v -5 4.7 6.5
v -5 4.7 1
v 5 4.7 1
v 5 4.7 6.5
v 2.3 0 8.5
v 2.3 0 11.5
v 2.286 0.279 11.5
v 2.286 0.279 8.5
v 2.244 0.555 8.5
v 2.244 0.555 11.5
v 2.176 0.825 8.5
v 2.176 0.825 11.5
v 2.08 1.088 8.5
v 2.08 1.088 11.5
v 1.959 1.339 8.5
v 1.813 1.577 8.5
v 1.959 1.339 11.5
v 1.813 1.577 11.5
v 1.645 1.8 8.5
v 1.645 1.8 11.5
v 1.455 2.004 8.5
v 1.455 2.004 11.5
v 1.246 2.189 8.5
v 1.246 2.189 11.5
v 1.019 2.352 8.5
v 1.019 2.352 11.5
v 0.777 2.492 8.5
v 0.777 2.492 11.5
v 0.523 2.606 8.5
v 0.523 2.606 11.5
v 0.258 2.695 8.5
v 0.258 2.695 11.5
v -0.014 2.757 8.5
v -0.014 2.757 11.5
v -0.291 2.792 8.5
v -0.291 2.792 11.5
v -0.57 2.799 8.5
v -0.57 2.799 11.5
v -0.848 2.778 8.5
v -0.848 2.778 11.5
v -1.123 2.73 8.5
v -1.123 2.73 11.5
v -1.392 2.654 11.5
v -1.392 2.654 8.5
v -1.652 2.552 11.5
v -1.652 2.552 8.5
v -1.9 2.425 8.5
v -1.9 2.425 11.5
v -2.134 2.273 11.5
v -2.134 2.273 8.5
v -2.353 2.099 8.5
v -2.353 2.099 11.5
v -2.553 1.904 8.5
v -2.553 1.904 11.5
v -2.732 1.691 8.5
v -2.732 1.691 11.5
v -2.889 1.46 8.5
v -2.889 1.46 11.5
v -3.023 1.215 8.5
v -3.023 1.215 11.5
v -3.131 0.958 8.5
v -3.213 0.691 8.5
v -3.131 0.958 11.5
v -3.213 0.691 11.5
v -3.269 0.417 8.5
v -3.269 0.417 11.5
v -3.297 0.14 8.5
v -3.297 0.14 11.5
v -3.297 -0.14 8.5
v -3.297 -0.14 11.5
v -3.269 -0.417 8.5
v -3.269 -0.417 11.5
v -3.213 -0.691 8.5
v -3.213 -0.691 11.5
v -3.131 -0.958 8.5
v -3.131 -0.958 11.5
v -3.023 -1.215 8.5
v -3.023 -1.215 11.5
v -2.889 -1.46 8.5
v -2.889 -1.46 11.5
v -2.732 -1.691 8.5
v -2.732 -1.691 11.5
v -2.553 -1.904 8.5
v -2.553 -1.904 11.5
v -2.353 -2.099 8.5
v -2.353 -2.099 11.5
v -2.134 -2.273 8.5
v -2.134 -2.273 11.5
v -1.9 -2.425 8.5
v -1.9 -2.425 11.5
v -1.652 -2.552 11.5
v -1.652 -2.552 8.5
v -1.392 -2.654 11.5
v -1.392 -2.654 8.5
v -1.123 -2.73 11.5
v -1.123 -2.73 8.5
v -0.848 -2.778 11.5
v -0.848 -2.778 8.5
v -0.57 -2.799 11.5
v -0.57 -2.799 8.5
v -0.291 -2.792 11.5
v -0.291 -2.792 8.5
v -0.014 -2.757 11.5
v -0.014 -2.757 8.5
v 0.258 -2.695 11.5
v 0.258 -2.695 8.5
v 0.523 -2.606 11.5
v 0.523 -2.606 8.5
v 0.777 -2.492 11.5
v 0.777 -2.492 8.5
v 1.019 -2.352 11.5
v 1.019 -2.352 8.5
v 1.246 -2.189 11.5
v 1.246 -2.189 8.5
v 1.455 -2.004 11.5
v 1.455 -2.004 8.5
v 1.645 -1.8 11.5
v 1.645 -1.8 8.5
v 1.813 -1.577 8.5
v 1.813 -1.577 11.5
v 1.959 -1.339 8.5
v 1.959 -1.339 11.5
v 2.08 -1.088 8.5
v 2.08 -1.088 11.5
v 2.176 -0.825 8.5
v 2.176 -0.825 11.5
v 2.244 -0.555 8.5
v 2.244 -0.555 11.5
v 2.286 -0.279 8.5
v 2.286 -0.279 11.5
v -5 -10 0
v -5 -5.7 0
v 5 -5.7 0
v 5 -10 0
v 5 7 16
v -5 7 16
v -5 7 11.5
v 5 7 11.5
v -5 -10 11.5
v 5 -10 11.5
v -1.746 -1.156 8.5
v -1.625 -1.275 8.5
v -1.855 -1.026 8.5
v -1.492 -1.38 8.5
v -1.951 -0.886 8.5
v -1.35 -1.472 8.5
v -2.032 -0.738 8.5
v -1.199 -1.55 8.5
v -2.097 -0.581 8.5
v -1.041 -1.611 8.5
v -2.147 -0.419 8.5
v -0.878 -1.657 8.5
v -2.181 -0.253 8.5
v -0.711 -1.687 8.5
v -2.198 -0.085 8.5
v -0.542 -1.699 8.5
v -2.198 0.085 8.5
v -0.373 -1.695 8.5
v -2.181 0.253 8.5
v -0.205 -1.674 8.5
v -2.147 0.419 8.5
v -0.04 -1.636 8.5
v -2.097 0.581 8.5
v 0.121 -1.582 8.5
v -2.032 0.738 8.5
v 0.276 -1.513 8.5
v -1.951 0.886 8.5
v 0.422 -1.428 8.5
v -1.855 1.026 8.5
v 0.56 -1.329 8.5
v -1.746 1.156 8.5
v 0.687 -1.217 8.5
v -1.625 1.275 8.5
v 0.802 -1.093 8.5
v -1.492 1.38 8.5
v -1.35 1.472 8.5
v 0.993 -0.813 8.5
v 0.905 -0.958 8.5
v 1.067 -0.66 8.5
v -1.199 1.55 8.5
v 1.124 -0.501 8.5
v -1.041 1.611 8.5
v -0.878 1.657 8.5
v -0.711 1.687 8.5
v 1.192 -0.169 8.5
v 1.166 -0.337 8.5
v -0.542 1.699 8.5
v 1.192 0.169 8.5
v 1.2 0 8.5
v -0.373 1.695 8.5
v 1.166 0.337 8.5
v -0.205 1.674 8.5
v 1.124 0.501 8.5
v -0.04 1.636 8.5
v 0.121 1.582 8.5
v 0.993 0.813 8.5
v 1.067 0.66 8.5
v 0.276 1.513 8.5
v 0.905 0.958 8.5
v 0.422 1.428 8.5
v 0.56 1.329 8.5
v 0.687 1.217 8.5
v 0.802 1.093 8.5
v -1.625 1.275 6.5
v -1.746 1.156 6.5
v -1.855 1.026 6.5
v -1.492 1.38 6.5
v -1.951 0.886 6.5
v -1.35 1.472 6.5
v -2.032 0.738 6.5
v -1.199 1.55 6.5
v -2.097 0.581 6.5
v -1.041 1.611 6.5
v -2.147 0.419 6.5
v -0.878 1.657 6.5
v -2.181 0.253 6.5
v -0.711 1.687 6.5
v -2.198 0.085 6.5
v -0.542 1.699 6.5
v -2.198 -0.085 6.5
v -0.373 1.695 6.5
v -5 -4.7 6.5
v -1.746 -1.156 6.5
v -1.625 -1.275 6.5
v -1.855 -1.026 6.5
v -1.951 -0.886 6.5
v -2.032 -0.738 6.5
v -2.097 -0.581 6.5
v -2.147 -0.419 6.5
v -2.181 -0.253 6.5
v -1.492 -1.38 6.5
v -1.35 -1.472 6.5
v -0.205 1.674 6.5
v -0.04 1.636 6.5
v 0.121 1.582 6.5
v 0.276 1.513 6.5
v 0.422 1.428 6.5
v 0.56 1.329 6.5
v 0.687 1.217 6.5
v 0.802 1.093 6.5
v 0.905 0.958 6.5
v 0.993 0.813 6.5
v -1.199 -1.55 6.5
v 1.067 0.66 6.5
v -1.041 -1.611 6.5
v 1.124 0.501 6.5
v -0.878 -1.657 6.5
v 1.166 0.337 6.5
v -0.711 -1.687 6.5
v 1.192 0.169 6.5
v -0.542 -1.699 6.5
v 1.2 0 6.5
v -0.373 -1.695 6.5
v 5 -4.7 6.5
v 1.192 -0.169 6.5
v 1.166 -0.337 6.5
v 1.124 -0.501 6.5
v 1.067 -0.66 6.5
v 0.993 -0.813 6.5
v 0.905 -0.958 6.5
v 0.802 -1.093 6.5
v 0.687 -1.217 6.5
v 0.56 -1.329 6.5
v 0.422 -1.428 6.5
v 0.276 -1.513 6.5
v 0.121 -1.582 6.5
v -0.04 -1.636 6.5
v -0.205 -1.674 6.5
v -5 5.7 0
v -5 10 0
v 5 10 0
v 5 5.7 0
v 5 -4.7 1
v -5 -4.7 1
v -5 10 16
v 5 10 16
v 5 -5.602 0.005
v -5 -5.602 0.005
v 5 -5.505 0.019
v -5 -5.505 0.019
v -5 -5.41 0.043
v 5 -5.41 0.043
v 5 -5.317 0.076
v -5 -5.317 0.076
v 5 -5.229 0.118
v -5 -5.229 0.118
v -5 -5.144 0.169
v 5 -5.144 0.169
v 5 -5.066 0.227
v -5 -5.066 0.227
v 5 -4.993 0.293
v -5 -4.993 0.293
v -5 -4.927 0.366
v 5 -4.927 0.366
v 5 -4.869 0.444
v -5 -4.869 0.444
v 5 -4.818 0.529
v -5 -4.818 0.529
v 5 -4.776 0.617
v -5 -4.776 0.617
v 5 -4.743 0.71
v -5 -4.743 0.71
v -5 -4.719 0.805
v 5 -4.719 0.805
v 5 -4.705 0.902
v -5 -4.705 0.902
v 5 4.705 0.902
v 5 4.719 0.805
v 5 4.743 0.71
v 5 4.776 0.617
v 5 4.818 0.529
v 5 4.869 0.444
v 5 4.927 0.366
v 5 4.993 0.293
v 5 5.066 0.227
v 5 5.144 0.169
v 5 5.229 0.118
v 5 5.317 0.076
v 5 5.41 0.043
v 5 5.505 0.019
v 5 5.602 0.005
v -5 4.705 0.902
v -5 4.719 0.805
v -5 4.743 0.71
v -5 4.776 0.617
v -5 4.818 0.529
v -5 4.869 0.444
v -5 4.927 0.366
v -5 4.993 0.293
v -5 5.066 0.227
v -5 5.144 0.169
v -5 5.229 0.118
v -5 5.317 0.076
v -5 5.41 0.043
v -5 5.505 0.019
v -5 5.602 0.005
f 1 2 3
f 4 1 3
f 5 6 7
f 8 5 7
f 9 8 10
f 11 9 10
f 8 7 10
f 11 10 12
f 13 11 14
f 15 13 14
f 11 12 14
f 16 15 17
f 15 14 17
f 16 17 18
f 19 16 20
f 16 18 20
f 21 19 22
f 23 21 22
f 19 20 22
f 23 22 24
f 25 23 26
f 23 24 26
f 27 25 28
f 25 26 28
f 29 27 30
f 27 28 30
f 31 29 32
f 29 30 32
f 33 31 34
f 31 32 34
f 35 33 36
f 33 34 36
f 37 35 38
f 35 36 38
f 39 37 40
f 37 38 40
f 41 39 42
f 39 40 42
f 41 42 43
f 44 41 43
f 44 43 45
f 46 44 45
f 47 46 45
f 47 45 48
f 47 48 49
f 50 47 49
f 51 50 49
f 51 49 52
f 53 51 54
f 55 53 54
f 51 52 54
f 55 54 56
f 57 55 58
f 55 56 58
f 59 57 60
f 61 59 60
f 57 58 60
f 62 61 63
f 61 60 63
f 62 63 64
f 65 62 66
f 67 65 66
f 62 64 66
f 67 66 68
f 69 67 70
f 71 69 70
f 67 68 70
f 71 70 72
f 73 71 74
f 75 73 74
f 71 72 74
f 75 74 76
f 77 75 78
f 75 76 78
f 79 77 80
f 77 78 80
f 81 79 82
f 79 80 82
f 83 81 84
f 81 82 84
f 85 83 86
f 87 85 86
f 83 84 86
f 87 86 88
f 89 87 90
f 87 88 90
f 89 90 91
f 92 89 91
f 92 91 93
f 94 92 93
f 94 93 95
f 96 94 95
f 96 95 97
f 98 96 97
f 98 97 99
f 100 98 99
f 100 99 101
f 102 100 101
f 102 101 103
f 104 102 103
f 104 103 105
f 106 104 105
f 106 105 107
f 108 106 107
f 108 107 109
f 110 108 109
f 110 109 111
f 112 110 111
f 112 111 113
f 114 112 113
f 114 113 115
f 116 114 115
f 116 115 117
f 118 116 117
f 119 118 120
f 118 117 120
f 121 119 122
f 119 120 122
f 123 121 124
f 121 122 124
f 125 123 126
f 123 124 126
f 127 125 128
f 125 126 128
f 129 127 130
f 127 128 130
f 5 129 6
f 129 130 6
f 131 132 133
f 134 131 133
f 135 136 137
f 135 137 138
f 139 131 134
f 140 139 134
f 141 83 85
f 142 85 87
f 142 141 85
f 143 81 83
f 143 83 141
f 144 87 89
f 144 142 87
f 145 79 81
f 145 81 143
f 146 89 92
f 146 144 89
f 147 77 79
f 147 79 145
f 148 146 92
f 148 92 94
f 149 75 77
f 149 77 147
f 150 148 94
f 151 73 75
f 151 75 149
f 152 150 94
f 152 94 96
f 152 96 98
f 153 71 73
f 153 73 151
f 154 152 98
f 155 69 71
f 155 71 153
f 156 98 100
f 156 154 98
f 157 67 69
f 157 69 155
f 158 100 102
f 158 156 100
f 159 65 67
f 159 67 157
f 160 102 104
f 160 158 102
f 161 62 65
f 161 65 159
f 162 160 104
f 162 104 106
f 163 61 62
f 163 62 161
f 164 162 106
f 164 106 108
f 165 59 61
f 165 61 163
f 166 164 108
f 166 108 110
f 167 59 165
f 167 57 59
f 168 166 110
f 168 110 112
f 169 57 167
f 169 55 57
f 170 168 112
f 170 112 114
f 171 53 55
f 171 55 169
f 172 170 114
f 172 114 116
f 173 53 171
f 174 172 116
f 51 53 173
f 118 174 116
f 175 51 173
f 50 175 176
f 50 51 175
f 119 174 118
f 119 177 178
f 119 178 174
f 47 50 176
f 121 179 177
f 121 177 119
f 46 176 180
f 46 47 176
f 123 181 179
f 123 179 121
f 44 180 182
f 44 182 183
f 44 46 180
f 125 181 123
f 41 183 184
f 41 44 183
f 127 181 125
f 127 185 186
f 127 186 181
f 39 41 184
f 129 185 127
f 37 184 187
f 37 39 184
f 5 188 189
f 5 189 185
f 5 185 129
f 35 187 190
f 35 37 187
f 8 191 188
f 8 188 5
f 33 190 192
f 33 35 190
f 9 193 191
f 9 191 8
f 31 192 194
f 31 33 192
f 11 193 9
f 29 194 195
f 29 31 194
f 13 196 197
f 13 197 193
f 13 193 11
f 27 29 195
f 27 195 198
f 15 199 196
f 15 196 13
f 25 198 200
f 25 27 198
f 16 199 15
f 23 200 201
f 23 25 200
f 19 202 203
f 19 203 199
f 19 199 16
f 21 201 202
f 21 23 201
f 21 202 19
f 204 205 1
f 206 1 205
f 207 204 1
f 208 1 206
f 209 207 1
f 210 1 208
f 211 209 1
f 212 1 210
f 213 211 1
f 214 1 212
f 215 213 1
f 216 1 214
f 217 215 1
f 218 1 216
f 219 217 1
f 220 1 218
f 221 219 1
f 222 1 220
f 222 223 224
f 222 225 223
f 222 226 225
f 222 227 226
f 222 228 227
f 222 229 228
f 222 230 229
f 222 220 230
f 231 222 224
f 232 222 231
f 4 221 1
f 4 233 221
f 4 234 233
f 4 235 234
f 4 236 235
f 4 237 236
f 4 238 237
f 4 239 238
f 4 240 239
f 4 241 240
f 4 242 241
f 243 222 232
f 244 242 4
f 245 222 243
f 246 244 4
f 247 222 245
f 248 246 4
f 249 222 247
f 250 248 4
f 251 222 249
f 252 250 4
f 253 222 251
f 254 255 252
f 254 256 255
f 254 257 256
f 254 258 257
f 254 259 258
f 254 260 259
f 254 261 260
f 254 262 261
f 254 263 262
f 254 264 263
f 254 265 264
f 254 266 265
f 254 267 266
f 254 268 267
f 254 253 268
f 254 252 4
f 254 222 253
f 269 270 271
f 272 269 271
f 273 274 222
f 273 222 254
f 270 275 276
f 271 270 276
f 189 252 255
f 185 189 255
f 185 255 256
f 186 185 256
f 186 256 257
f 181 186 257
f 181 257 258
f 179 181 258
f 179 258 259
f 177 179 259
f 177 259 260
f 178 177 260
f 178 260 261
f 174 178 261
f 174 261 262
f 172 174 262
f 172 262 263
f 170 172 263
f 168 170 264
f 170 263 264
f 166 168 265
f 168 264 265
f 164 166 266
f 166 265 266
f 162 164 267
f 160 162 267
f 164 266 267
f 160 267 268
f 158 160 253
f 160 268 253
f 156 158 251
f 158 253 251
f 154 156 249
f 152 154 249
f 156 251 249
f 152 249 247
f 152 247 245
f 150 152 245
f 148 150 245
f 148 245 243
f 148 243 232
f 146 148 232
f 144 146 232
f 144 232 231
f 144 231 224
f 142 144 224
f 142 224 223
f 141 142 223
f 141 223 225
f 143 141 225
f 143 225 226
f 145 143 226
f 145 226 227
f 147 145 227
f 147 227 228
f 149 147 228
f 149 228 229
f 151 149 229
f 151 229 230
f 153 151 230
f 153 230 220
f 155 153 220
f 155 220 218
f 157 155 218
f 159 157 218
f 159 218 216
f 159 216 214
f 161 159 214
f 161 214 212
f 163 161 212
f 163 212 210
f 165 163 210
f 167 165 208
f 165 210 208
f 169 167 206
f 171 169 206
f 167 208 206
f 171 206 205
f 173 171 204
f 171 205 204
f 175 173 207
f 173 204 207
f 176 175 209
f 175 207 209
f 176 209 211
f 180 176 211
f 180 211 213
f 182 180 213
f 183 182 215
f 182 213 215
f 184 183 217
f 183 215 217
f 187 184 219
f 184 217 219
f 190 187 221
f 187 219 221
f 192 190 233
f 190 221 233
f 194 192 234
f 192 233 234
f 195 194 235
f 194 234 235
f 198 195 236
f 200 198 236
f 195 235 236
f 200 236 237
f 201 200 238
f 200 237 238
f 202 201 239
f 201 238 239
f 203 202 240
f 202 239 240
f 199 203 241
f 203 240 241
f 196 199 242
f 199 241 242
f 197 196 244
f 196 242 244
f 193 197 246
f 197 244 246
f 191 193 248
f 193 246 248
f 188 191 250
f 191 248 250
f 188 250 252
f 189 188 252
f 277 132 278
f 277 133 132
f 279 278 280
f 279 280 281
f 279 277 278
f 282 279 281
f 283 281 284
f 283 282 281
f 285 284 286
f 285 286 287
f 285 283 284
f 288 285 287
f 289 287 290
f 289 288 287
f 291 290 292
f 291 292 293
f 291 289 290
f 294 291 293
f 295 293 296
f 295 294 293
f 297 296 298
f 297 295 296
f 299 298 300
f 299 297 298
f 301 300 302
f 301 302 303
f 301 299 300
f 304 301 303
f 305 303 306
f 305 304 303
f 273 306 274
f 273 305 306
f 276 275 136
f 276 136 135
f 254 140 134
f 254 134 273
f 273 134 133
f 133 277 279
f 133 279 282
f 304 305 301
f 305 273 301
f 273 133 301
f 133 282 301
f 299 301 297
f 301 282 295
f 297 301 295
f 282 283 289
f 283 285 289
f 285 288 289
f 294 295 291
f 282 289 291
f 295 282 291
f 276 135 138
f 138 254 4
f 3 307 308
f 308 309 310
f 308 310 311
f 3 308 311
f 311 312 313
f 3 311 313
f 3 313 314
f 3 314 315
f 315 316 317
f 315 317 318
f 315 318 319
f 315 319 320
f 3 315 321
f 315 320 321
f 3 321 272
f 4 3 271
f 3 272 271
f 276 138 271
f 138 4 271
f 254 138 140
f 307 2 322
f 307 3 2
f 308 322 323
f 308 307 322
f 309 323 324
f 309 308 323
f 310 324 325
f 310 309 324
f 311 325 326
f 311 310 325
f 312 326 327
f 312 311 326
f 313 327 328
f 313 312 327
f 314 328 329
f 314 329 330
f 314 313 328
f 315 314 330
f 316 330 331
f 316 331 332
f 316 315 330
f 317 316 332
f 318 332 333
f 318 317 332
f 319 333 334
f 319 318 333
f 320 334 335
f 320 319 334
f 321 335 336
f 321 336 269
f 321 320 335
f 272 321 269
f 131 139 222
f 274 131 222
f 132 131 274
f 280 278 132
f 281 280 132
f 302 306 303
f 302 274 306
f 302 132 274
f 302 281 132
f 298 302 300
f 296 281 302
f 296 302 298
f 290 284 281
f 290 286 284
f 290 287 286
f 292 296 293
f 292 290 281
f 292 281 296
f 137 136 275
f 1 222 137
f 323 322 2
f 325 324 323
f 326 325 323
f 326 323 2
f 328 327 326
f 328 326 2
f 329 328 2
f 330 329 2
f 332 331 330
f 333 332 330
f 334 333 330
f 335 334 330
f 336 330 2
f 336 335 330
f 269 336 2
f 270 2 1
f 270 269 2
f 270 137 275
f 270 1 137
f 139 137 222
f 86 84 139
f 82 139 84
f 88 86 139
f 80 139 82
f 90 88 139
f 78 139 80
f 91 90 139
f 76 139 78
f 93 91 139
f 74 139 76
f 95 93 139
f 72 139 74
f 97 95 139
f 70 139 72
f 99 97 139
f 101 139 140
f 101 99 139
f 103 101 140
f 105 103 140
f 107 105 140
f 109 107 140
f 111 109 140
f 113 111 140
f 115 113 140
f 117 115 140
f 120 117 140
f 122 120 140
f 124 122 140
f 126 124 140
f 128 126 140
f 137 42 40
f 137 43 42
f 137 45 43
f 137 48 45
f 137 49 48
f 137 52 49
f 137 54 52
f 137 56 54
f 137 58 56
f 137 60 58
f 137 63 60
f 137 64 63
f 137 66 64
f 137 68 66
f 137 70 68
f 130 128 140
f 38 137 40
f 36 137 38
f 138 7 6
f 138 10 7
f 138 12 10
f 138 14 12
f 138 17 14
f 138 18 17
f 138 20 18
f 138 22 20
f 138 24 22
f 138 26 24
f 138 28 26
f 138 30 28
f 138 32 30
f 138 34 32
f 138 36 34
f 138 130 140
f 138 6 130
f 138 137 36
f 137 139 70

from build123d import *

# Parameters (mm, degrees)
SKETCH_W        = 10
SKETCH_H        = 20
PAD_DEPTH       = 16
SKETCH001_W     = 10
SKETCH001_H     = 17
POCKET_DEPTH    = 4.5
SKETCH002_W     = 10
SKETCH002_H     = 9.4
POCKET001_DEPTH = 6.5
SKETCH003_R     = 1.7
POCKET002_DEPTH = 5
SKETCH004_R     = 2.8
POCKET003_DEPTH = 3
FILLET_R        = 1
FILLET001_R     = 1


with BuildPart() as part:
    # Sketch → Pad (new body)
    with BuildSketch(Plane.XY):
        Rectangle(SKETCH_W, SKETCH_H)
    extrude(amount=PAD_DEPTH)

    # Sketch001 (on Face6 of Pad) → Pocket (cut)
    with BuildSketch(Plane.XY.offset(16)):
        with Locations((0, -1.5)):
            Rectangle(SKETCH001_W, SKETCH001_H)
    extrude(amount=-POCKET_DEPTH, mode=Mode.SUBTRACT)

    # Sketch002 (on Face4 of Pocket) → Pocket001 (cut)
    with BuildSketch(Plane(origin=(0, 0, 0), x_dir=(1, 0, 0), z_dir=(0, 0, -1))):
        Rectangle(SKETCH002_W, SKETCH002_H)
    extrude(amount=-POCKET001_DEPTH, mode=Mode.SUBTRACT)

    # Sketch003 (on Face8 of Pocket001) → Pocket002 (cut)
    with BuildSketch(Plane(origin=(0, 0, 6.5), x_dir=(1, 0, 0), z_dir=(0, 0, -1))):
        with Locations((-0.5, 0)):
            Circle(SKETCH003_R)
    extrude(amount=-POCKET002_DEPTH, mode=Mode.SUBTRACT)

    # Sketch004 (on Face11 of Pocket002) → Pocket003 (cut)
    with BuildSketch(Plane.XY.offset(11.5)):
        with Locations((-0.5, 0)):
            Circle(SKETCH004_R)
    extrude(amount=-POCKET003_DEPTH, mode=Mode.SUBTRACT)

    # Fillet
    fillet_edges = [part.edges().sort_by_distance(p)[0] for p in [
        (0, -4.7, 0),
    ]]
    fillet(fillet_edges, radius=FILLET_R)

    # Fillet001
    fillet001_edges = [part.edges().sort_by_distance(p)[0] for p in [
        (0, 4.7, 0),
    ]]
    fillet(fillet001_edges, radius=FILLET001_R)


solid = part.part
